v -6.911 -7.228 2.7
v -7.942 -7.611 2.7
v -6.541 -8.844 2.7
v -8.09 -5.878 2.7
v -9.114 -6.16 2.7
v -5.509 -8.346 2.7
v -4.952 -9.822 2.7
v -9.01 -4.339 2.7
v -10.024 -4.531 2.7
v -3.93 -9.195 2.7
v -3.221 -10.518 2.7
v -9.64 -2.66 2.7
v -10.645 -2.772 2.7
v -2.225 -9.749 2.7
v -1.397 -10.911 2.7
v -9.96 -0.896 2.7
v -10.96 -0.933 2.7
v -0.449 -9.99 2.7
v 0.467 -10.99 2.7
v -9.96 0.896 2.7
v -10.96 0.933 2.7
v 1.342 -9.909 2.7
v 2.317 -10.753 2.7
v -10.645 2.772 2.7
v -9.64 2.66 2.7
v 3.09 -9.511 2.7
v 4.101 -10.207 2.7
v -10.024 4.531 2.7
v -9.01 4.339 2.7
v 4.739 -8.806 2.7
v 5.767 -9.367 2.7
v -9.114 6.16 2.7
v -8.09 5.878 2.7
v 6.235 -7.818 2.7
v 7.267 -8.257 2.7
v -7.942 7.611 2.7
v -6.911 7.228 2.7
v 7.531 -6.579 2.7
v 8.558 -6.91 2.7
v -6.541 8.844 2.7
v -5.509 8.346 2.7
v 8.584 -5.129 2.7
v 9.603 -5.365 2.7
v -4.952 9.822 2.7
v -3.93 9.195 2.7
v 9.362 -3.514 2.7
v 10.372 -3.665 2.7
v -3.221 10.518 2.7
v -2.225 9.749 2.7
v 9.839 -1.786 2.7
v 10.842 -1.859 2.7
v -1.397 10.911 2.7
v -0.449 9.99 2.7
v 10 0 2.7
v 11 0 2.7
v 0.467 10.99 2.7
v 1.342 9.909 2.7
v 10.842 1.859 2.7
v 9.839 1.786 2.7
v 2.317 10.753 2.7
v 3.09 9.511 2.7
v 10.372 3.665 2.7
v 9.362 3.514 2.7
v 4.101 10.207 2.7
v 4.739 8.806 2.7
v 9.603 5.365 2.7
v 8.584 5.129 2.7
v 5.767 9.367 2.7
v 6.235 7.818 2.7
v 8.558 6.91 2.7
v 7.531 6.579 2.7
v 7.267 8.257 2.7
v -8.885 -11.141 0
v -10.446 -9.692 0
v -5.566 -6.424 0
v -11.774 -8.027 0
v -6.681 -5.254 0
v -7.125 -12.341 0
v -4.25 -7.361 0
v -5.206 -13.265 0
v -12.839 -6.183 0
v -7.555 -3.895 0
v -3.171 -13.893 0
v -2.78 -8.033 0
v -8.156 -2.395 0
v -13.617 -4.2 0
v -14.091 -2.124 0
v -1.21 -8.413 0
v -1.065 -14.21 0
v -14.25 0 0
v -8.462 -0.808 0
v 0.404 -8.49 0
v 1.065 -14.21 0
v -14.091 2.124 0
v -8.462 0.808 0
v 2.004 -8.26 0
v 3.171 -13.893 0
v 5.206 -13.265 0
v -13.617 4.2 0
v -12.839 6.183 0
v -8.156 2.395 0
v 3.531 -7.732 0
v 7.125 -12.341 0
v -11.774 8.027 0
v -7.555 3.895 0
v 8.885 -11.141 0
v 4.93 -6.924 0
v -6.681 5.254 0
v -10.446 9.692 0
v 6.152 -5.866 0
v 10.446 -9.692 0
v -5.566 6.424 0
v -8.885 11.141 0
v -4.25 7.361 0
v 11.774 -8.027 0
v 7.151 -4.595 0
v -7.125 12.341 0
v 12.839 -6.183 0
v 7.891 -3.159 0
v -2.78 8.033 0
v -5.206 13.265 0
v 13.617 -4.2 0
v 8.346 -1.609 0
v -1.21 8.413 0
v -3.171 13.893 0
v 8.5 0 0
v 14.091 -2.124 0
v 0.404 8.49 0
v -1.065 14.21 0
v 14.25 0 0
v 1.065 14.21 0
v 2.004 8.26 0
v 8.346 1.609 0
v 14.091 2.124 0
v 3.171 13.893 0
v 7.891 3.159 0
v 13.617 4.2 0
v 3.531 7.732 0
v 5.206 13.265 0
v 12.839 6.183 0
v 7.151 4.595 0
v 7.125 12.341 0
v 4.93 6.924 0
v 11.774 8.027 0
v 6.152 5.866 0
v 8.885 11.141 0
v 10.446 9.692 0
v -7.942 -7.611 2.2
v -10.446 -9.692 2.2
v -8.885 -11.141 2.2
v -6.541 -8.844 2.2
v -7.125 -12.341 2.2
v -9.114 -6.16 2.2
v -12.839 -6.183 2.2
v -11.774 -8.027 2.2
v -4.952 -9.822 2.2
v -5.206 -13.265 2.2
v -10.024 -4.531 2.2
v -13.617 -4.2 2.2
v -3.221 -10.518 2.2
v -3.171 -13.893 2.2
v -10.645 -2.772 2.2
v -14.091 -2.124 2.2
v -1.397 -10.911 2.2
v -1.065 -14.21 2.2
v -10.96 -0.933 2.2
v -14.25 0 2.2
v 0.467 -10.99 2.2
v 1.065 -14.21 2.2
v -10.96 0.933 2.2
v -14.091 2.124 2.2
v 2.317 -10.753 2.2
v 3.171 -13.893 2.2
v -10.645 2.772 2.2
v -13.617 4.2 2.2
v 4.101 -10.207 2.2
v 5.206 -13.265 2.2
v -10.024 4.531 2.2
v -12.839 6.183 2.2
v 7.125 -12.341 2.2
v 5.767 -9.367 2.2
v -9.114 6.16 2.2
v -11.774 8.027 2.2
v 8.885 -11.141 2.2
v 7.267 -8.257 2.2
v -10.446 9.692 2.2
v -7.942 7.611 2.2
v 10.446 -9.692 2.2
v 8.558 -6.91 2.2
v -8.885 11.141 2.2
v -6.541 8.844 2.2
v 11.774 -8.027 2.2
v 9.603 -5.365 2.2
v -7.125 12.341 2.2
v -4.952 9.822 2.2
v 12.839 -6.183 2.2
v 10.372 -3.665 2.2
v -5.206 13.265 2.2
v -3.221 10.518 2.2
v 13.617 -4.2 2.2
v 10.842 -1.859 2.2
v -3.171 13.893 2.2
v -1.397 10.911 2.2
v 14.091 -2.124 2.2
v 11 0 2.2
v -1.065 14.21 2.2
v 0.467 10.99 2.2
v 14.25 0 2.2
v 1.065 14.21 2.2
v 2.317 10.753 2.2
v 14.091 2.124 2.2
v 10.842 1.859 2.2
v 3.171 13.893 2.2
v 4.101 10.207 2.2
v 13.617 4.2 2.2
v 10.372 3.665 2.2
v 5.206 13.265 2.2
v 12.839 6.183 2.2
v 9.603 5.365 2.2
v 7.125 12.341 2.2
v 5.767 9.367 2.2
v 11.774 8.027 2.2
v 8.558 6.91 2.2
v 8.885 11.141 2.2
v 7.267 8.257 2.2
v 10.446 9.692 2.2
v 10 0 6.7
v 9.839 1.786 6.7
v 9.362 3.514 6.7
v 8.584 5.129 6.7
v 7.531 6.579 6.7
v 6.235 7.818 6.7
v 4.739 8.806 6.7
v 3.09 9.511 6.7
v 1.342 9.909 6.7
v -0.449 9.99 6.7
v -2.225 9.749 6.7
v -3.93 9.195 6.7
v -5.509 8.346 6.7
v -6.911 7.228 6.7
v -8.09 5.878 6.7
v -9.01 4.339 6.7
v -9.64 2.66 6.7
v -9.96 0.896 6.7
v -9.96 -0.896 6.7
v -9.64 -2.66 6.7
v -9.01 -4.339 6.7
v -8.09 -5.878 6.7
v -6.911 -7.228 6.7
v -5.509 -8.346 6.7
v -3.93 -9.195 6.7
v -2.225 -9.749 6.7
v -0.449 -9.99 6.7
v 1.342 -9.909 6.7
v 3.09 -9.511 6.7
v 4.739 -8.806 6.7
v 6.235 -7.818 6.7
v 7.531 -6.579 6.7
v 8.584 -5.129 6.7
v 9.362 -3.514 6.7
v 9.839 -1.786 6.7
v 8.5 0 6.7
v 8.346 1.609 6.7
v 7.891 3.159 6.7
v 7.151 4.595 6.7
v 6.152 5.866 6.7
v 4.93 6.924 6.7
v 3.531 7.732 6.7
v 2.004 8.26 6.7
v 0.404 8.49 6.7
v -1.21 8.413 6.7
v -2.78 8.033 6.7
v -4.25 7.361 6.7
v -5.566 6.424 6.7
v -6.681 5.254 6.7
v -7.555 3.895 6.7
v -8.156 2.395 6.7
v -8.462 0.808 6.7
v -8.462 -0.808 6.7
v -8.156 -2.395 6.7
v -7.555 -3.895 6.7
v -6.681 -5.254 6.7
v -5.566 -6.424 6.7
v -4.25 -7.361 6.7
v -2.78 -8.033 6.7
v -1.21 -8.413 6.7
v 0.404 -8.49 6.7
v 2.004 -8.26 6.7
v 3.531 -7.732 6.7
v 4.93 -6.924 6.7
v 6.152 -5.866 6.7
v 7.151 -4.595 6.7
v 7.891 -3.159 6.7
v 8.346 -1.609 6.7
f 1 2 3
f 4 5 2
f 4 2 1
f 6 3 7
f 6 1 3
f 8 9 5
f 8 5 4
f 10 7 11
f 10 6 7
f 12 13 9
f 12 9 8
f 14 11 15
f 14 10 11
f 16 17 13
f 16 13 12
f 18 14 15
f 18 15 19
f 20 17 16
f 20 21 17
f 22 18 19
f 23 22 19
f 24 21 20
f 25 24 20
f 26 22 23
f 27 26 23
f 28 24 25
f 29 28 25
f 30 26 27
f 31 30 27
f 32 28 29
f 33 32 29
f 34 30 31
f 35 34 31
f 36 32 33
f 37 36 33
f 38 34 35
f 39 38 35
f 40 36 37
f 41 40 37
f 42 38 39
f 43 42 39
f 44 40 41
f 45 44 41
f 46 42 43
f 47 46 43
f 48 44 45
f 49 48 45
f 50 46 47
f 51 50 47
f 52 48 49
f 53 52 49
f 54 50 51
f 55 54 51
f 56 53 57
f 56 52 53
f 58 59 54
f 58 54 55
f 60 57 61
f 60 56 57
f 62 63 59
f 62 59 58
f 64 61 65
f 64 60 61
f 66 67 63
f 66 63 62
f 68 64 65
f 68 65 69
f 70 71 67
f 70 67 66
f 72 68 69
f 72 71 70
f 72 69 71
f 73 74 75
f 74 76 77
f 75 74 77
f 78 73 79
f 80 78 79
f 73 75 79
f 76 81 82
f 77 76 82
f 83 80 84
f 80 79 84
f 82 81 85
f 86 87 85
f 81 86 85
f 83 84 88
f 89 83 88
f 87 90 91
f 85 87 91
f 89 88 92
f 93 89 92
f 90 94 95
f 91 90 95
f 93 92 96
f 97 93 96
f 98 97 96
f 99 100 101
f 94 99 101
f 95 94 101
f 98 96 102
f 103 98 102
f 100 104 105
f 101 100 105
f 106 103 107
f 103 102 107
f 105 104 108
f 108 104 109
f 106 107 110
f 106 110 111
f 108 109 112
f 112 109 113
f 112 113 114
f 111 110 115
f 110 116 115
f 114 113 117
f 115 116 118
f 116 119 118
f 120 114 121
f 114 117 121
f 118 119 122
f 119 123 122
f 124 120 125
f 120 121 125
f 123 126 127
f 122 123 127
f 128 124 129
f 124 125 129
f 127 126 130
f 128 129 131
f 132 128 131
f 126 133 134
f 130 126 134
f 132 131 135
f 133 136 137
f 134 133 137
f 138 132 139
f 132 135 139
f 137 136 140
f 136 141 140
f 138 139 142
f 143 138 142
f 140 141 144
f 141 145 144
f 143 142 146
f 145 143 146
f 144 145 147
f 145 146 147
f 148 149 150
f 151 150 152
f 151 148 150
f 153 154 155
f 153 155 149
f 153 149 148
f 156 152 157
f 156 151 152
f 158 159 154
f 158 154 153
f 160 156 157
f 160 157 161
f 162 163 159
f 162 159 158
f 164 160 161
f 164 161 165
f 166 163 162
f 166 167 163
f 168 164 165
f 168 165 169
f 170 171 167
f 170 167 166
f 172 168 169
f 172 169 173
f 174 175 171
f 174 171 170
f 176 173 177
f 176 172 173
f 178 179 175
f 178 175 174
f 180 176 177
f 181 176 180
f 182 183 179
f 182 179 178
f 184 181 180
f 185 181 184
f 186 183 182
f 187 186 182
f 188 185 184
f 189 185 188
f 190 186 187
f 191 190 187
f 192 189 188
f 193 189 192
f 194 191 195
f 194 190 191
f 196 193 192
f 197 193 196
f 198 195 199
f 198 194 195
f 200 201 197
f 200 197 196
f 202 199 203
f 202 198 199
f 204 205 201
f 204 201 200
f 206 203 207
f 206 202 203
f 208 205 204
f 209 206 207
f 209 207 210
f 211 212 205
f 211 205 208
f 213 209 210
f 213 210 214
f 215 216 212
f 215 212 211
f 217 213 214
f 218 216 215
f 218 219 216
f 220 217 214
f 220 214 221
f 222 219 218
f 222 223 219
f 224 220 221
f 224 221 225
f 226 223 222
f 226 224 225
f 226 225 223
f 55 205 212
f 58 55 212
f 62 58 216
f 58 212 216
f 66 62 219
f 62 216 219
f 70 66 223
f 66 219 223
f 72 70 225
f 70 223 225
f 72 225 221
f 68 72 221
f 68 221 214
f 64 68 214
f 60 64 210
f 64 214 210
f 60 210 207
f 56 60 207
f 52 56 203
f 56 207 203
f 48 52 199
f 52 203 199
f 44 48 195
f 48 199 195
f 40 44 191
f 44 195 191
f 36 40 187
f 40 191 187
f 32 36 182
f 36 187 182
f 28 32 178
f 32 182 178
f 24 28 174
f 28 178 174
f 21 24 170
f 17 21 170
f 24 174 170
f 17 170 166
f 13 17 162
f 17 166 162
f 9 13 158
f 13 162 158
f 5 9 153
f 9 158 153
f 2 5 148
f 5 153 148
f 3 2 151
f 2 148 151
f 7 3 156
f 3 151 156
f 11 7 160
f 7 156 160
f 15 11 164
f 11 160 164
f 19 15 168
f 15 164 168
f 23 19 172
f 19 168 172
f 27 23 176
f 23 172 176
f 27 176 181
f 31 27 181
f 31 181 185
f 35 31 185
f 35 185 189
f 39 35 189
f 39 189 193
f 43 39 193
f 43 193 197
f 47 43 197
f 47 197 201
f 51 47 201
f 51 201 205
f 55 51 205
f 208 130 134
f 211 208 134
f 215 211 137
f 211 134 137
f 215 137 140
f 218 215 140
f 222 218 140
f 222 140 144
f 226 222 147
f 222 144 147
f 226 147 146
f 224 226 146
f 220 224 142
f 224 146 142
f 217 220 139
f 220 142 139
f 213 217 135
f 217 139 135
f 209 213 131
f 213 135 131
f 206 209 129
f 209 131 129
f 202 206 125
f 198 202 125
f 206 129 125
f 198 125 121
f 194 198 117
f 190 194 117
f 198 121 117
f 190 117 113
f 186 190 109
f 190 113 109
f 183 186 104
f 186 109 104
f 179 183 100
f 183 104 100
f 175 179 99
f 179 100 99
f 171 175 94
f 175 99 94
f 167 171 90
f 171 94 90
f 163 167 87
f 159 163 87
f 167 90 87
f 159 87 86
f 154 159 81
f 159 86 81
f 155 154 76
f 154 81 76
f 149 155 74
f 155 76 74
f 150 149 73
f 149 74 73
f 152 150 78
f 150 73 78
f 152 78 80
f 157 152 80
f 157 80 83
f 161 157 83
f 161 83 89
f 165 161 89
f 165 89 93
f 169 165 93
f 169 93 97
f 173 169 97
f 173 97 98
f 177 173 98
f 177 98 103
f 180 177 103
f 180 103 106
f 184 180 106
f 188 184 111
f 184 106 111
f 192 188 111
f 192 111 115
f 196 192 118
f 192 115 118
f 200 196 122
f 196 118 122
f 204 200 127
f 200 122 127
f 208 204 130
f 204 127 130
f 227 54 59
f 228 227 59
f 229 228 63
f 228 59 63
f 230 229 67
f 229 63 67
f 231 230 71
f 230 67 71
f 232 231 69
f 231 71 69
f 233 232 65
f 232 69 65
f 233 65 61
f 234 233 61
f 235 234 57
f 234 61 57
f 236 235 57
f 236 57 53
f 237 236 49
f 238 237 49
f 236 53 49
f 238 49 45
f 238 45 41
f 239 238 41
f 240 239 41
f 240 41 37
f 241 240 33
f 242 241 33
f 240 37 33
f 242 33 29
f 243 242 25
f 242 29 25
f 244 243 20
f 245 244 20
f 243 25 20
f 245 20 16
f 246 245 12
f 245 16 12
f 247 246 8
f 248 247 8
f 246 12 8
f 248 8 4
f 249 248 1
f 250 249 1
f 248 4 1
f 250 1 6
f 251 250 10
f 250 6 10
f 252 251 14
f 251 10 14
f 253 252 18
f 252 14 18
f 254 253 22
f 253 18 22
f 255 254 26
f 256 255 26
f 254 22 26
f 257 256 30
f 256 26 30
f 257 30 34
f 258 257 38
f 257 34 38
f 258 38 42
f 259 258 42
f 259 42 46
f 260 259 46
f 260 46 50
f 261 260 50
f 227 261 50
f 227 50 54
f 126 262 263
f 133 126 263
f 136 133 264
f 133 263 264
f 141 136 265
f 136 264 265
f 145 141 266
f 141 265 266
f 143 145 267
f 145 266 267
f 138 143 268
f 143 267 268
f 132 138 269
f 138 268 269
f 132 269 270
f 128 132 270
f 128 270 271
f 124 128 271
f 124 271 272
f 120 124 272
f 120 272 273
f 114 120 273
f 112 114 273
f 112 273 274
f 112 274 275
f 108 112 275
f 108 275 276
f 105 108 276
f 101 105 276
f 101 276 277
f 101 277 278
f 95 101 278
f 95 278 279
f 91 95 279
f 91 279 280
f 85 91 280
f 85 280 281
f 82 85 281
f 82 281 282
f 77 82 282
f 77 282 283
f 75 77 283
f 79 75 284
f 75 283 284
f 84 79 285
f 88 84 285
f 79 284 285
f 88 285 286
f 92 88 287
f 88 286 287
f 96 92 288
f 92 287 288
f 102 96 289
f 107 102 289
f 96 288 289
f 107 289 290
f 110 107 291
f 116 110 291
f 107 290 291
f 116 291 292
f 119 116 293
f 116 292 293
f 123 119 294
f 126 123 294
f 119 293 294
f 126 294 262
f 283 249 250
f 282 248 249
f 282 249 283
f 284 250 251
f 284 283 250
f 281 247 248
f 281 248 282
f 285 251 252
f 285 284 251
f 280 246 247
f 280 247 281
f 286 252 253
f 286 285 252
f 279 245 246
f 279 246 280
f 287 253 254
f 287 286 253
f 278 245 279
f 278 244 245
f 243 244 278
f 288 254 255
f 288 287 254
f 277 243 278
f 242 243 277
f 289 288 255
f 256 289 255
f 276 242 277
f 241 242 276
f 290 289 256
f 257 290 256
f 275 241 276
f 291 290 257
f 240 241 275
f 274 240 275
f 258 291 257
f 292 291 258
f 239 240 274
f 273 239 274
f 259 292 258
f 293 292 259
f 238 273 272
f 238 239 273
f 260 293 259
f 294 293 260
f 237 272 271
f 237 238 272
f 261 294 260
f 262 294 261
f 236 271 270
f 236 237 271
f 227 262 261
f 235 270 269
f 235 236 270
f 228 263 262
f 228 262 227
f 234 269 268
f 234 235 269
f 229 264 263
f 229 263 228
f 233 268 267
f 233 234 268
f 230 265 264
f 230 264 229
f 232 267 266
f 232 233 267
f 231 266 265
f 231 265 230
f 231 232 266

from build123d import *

# Parameters (mm, degrees)
SKETCH1_R          = 14.25
EXTRUDE1_DEPTH     = 2.2
SKETCH2_R          = 11
EXTRUDE2_DEPTH     = 0.5
SKETCH3_R          = 10
EXTRUDE3_DEPTH     = 4
SKETCH4_R          = 8.5
CUT_EXTRUDE1_DEPTH = 22.23711374


with BuildPart() as part:
    # Sketch1 → Extrude1 (new body)
    with BuildSketch(Plane.XY):
        Circle(SKETCH1_R)
    extrude(amount=EXTRUDE1_DEPTH)

    # Sketch2 → Extrude2 (add)
    with BuildSketch(Plane.XY.offset(2.2)):
        Circle(SKETCH2_R)
    extrude(amount=EXTRUDE2_DEPTH)

    # Sketch3 → Extrude3 (add)
    with BuildSketch(Plane.XY.offset(2.7)):
        Circle(SKETCH3_R)
    extrude(amount=EXTRUDE3_DEPTH)

    # Sketch4 → Cut-Extrude1 (cut, through all)
    with BuildSketch(Plane.XY.offset(6.7)):
        Circle(SKETCH4_R)
    extrude(amount=-CUT_EXTRUDE1_DEPTH, mode=Mode.SUBTRACT)


solid = part.part
